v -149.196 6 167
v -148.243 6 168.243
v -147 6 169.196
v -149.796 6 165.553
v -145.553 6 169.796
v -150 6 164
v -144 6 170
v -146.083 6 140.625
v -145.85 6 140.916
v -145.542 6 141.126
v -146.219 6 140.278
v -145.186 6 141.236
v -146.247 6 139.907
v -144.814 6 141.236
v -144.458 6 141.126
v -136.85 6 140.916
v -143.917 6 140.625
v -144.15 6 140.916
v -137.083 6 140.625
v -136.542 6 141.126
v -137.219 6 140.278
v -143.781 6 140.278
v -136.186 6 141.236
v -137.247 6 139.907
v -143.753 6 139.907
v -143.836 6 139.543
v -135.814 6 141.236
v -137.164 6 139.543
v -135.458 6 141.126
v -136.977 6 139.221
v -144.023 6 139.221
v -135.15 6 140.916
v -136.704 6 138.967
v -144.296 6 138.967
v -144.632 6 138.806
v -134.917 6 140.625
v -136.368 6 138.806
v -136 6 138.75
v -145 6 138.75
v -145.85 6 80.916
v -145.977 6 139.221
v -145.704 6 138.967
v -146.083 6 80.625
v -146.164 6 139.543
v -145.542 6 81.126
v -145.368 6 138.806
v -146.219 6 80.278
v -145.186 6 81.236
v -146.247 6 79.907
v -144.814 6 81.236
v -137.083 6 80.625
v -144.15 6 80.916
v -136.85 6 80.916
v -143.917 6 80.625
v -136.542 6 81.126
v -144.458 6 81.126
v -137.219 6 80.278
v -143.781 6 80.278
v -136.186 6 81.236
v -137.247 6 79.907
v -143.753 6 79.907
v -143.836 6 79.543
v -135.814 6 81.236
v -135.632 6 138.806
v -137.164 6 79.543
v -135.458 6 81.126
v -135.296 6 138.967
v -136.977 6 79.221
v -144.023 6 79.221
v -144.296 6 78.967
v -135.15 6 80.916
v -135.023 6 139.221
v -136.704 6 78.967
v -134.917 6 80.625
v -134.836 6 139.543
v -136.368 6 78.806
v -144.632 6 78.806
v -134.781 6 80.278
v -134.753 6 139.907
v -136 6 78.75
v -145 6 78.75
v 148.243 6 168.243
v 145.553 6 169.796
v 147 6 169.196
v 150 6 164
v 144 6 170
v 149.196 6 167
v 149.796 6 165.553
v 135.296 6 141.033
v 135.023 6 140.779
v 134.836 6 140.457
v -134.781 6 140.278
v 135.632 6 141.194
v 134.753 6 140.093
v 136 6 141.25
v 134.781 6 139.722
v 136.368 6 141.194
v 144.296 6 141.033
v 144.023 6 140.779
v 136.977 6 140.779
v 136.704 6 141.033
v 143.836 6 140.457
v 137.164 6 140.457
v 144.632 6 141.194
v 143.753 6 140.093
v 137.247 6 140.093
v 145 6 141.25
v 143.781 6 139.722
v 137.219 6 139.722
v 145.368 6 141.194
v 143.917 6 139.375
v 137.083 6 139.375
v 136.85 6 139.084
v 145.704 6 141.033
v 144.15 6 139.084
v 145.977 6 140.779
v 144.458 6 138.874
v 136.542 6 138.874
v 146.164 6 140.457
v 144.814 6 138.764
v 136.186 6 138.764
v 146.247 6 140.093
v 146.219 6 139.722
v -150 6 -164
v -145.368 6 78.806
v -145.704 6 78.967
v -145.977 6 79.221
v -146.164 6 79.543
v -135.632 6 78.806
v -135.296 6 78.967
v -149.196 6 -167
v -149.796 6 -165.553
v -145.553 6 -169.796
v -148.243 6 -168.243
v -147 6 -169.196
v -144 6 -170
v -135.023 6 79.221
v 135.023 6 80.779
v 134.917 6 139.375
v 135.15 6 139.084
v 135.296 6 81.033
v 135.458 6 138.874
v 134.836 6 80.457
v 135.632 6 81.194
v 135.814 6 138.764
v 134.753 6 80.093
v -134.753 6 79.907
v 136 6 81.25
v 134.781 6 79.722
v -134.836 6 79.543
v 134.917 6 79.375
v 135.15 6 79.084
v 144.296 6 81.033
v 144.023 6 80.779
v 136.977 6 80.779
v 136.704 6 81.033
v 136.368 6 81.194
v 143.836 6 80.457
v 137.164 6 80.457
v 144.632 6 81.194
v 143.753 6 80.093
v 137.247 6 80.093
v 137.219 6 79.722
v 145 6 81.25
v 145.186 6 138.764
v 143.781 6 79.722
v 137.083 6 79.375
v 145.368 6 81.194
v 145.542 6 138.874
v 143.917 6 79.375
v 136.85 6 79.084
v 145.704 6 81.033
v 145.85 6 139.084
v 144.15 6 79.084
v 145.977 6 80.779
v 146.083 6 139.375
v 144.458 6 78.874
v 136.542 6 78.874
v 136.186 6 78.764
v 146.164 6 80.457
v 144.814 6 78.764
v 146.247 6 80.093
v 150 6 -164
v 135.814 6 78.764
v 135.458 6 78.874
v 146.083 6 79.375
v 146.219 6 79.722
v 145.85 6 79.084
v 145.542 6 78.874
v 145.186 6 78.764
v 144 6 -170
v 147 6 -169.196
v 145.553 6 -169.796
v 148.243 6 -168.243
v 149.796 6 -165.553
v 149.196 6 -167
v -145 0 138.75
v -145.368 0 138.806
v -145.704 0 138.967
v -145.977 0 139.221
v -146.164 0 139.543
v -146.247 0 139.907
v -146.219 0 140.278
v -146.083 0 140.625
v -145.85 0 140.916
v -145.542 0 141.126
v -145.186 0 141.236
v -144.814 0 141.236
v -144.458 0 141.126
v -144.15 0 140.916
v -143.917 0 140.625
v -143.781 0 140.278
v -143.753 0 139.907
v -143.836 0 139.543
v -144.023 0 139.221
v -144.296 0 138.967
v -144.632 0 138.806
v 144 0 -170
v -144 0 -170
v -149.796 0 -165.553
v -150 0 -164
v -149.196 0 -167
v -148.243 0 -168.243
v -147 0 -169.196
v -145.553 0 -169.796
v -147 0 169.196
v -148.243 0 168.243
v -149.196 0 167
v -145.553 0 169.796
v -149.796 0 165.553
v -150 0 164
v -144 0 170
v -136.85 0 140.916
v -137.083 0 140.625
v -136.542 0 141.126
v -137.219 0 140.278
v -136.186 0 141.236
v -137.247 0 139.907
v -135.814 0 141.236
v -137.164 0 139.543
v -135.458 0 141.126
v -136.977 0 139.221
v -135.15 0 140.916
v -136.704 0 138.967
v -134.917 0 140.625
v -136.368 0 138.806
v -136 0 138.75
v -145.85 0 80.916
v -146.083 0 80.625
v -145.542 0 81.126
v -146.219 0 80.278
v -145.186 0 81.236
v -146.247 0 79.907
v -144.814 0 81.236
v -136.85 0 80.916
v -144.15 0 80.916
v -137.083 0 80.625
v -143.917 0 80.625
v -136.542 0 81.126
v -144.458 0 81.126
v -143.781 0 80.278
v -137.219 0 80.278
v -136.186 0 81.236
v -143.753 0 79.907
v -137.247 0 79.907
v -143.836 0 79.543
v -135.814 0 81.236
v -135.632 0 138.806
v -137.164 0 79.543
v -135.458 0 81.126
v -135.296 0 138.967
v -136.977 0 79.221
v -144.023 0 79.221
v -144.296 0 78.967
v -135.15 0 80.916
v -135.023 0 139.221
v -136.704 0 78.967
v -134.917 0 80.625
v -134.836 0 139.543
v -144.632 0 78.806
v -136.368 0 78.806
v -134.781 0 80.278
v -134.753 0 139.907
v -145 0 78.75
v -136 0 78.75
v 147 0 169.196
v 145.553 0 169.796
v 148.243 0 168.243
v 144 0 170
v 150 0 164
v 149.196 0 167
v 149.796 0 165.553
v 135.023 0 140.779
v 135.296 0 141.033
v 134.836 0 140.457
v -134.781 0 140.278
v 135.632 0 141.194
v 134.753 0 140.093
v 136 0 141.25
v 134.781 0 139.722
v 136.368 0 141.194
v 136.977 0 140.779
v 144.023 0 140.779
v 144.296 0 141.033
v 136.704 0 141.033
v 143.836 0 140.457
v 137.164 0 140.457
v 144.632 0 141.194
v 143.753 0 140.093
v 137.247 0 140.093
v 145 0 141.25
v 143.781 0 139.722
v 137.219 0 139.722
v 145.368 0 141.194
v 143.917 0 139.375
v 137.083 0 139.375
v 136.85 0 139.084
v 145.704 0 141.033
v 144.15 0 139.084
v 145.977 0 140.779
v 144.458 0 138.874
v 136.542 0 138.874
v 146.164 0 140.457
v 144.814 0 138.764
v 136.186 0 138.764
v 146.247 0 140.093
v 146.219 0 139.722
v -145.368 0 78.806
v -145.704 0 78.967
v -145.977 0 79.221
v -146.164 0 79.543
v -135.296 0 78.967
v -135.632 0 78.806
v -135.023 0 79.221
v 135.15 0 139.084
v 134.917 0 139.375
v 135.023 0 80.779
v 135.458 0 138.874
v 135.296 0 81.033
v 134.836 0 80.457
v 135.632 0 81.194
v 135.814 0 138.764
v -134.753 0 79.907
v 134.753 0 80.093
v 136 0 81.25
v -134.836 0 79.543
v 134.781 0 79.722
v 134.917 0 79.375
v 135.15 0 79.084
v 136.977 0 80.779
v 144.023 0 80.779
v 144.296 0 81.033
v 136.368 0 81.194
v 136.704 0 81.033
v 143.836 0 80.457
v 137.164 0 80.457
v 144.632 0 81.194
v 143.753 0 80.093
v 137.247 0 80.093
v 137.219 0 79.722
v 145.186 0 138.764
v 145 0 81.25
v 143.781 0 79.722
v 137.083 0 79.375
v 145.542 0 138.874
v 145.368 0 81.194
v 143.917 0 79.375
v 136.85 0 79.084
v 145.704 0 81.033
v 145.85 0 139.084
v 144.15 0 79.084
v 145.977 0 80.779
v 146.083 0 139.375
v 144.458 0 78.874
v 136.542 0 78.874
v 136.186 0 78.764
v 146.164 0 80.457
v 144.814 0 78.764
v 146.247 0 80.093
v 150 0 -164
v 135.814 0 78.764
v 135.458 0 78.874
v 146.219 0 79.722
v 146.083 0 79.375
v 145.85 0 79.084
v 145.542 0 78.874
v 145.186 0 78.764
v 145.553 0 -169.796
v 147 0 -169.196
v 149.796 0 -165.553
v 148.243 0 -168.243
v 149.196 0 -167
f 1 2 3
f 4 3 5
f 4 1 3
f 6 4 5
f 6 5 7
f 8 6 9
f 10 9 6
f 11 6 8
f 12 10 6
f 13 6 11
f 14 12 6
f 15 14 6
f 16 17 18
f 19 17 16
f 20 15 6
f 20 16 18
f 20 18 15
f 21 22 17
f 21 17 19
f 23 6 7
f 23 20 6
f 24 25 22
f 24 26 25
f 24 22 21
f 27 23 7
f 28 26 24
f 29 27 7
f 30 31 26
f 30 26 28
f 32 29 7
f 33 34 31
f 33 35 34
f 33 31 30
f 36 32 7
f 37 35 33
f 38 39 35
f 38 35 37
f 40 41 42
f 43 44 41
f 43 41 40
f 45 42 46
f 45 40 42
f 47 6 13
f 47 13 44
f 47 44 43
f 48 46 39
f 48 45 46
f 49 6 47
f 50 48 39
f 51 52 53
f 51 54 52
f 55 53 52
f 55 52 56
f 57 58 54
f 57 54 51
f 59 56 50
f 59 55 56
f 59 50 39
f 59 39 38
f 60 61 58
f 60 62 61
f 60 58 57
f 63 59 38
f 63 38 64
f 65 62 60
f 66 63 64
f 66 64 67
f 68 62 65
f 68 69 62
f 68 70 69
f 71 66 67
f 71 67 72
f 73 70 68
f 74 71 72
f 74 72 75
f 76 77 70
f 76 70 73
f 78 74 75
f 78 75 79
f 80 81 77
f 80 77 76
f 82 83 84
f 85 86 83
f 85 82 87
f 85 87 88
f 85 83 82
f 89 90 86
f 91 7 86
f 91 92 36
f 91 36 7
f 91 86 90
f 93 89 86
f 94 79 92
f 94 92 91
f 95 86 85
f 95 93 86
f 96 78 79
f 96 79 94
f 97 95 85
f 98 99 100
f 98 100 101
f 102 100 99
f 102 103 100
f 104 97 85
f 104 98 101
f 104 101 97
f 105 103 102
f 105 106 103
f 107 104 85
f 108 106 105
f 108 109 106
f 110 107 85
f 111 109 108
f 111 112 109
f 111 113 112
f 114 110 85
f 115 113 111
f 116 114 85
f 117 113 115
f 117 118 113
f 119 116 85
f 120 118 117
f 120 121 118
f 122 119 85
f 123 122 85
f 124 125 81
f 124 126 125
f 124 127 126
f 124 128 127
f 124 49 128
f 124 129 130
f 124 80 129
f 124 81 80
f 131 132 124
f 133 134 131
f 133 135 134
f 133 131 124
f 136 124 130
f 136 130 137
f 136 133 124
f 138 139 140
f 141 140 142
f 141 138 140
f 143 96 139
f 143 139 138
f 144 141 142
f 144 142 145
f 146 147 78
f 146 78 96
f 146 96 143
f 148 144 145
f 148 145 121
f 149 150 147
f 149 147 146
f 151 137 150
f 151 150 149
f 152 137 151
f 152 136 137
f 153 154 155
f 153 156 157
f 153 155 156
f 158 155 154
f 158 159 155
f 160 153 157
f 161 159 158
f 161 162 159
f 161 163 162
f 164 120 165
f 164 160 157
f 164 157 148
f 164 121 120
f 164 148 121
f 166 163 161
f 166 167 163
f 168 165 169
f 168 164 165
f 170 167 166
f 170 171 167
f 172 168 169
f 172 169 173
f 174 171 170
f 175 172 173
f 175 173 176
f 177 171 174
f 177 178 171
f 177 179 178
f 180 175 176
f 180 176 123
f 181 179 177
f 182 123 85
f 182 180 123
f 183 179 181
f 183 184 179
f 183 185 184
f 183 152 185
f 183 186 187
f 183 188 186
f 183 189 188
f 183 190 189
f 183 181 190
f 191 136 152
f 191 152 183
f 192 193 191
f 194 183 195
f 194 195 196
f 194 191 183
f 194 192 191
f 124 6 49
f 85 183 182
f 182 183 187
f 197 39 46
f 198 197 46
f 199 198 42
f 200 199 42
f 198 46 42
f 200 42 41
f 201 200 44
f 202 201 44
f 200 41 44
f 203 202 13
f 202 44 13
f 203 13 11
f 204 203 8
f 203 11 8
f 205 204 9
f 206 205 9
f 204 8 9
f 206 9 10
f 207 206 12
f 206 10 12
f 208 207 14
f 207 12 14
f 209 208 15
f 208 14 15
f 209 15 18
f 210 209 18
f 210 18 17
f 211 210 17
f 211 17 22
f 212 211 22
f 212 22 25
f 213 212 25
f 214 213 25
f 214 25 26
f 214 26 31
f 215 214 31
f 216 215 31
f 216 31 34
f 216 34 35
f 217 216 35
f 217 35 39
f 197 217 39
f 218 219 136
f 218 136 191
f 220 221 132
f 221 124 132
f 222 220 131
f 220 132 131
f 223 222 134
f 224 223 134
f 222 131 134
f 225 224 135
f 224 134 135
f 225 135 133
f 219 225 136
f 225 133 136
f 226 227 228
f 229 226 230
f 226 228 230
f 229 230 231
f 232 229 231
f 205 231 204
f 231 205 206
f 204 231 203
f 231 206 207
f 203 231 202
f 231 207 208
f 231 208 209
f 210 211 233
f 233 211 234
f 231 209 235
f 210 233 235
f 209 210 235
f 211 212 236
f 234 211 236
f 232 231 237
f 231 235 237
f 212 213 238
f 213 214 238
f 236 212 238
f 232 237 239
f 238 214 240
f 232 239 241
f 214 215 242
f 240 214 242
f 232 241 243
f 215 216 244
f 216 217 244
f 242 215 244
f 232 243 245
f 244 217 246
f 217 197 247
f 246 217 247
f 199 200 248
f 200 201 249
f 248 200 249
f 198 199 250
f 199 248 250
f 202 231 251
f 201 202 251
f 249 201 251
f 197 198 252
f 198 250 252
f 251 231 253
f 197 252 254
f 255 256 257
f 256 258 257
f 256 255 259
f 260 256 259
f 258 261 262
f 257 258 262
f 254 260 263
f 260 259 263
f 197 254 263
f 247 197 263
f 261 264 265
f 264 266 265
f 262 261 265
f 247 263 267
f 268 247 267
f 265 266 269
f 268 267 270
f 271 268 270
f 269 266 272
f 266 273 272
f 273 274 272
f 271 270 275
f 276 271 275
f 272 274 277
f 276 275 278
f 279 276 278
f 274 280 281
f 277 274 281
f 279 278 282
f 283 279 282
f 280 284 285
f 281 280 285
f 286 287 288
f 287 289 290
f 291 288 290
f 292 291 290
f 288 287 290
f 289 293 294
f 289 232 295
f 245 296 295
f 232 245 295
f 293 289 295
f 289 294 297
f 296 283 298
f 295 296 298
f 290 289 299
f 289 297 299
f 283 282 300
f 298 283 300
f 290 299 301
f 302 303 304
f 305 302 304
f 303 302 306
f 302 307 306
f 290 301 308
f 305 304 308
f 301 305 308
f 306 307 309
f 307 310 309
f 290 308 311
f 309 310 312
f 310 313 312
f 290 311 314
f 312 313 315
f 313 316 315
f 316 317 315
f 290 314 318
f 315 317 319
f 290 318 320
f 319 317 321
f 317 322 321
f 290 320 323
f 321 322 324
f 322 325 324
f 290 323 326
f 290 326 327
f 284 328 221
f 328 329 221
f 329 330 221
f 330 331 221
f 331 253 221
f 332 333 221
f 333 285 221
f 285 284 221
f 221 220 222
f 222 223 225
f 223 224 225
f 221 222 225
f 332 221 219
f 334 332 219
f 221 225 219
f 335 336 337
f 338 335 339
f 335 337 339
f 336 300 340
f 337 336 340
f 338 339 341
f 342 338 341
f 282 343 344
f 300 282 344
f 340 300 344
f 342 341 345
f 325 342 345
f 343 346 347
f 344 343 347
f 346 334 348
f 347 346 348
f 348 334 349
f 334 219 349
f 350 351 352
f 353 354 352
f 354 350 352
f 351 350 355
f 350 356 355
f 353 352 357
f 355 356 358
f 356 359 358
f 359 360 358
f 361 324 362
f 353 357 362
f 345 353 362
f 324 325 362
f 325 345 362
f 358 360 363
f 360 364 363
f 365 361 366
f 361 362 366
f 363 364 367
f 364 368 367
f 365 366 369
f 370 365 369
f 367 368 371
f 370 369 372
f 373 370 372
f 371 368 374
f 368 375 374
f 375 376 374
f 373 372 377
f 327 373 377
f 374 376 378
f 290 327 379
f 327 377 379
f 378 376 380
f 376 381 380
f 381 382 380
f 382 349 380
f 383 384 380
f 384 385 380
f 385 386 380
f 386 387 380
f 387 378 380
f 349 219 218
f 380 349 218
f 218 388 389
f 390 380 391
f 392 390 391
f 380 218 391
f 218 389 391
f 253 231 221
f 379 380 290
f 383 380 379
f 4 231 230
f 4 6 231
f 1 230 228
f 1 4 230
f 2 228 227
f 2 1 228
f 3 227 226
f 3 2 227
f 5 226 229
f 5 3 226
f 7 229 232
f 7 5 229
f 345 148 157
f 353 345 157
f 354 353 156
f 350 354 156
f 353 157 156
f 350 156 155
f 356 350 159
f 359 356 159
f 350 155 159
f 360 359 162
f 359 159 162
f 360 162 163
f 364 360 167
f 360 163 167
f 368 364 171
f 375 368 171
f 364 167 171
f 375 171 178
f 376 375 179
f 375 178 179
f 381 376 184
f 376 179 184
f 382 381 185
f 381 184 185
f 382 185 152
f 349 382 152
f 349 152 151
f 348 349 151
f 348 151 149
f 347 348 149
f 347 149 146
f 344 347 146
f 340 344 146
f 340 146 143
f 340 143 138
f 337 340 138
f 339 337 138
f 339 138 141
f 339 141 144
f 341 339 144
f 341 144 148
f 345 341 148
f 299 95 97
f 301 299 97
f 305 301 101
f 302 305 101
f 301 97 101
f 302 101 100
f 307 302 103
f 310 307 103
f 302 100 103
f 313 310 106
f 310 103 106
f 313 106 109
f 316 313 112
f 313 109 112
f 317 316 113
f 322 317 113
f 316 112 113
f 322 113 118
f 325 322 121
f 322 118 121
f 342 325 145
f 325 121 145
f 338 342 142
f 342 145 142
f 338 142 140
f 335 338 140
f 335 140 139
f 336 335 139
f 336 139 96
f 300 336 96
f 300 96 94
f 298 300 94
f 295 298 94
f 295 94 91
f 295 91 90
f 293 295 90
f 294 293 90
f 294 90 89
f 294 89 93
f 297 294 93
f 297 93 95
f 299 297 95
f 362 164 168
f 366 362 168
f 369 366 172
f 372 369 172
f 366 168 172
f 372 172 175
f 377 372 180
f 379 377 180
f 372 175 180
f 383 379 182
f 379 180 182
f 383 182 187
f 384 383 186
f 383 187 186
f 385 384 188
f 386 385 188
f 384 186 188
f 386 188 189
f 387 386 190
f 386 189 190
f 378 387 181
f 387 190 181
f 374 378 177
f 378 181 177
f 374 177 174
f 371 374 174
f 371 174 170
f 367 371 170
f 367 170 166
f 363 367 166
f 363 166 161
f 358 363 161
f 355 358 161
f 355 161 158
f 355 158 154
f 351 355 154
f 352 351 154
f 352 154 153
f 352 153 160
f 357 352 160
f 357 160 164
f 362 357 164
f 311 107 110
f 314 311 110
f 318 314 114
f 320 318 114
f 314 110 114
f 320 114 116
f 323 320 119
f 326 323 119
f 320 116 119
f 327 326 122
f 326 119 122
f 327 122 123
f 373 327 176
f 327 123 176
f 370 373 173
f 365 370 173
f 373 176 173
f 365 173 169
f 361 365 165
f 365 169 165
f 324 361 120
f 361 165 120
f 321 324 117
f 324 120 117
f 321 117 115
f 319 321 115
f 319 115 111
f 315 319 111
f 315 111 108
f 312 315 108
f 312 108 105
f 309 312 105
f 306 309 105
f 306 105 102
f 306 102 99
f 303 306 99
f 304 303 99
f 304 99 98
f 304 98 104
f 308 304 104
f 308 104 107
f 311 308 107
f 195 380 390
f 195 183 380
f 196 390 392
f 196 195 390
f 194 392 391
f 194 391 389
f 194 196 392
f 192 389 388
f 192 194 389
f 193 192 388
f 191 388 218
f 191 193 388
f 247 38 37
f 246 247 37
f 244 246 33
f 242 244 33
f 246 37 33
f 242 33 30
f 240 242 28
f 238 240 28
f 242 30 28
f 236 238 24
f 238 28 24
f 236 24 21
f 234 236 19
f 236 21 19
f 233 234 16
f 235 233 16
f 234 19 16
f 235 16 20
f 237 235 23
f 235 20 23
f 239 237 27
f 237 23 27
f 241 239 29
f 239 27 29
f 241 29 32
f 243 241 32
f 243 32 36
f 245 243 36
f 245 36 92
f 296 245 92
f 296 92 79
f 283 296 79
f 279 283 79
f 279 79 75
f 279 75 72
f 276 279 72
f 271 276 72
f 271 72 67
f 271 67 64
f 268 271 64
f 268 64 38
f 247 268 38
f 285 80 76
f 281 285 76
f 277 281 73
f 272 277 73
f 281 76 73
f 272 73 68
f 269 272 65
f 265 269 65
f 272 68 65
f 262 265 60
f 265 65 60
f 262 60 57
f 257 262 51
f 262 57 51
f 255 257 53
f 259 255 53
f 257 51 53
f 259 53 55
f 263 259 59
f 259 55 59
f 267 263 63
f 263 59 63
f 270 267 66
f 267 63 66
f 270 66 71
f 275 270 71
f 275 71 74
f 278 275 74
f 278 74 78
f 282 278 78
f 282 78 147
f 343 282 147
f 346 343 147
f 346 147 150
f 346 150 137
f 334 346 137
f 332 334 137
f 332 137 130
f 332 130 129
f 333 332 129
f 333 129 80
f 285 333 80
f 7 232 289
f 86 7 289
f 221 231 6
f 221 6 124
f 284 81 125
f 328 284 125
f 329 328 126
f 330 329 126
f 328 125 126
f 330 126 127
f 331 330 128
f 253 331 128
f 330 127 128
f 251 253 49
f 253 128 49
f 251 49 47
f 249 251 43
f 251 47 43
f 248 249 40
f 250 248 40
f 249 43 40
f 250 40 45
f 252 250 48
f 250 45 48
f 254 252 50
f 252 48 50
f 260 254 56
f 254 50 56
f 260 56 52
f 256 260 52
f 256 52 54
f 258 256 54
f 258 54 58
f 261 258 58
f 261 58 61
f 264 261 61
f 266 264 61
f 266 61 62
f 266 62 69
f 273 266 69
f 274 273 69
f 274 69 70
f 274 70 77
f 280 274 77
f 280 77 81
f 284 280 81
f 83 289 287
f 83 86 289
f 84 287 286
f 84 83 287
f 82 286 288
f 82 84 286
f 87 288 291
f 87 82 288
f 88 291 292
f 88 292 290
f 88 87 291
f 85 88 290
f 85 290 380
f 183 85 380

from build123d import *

# Parameters (mm, degrees)
SKETCH1_W           = 300
SKETCH1_H           = 340
BOSS_EXTRUDE1_DEPTH = 6
FILLET1_R           = 6
SKETCH2_R           = 1.25
CUT_EXTRUDE1_DEPTH  = 227.795061675


with BuildPart() as part:
    # Sketch1 → Boss-Extrude1 (new body)
    with BuildSketch(Plane(origin=(0, 0, 0), x_dir=(1, 0, 0), z_dir=(0, 1, 0))):
        Rectangle(SKETCH1_W, SKETCH1_H)
    extrude(amount=BOSS_EXTRUDE1_DEPTH)

    # Fillet1
    fillet1_edges = [part.edges().sort_by_distance(p)[0] for p in [
        (150, 3, 170),
        (-150, 3, 170),
        (-150, 3, -170),
        (150, 3, -170),
    ]]
    fillet(fillet1_edges, radius=FILLET1_R)

    # Sketch2 → Cut-Extrude1 (cut, through all)
    with BuildSketch(Plane(origin=(0, 6, 0), x_dir=(1, 0, 0), z_dir=(0, 1, 0))):
        with Locations(Location((136, -80, 0), (0, 0, 270))):
            Circle(SKETCH2_R)
        with Locations(Location((145, -80, 0), (0, 0, 270))):
            Circle(SKETCH2_R)
        with Locations(Location((145, -140, 0), (0, 0, 270))):
            Circle(SKETCH2_R)
        with Locations(Location((136, -140, 0), (0, 0, 270))):
            Circle(SKETCH2_R)
        with Locations(Location((-136, -140, 0), (0, 0, 90))):
            Circle(SKETCH2_R)
        with Locations(Location((-145, -140, 0), (0, 0, 90))):
            Circle(SKETCH2_R)
        with Locations(Location((-145, -80, 0), (0, 0, 90))):
            Circle(SKETCH2_R)
        with Locations(Location((-136, -80, 0), (0, 0, 90))):
            Circle(SKETCH2_R)
    extrude(amount=-CUT_EXTRUDE1_DEPTH, mode=Mode.SUBTRACT)


solid = part.part
